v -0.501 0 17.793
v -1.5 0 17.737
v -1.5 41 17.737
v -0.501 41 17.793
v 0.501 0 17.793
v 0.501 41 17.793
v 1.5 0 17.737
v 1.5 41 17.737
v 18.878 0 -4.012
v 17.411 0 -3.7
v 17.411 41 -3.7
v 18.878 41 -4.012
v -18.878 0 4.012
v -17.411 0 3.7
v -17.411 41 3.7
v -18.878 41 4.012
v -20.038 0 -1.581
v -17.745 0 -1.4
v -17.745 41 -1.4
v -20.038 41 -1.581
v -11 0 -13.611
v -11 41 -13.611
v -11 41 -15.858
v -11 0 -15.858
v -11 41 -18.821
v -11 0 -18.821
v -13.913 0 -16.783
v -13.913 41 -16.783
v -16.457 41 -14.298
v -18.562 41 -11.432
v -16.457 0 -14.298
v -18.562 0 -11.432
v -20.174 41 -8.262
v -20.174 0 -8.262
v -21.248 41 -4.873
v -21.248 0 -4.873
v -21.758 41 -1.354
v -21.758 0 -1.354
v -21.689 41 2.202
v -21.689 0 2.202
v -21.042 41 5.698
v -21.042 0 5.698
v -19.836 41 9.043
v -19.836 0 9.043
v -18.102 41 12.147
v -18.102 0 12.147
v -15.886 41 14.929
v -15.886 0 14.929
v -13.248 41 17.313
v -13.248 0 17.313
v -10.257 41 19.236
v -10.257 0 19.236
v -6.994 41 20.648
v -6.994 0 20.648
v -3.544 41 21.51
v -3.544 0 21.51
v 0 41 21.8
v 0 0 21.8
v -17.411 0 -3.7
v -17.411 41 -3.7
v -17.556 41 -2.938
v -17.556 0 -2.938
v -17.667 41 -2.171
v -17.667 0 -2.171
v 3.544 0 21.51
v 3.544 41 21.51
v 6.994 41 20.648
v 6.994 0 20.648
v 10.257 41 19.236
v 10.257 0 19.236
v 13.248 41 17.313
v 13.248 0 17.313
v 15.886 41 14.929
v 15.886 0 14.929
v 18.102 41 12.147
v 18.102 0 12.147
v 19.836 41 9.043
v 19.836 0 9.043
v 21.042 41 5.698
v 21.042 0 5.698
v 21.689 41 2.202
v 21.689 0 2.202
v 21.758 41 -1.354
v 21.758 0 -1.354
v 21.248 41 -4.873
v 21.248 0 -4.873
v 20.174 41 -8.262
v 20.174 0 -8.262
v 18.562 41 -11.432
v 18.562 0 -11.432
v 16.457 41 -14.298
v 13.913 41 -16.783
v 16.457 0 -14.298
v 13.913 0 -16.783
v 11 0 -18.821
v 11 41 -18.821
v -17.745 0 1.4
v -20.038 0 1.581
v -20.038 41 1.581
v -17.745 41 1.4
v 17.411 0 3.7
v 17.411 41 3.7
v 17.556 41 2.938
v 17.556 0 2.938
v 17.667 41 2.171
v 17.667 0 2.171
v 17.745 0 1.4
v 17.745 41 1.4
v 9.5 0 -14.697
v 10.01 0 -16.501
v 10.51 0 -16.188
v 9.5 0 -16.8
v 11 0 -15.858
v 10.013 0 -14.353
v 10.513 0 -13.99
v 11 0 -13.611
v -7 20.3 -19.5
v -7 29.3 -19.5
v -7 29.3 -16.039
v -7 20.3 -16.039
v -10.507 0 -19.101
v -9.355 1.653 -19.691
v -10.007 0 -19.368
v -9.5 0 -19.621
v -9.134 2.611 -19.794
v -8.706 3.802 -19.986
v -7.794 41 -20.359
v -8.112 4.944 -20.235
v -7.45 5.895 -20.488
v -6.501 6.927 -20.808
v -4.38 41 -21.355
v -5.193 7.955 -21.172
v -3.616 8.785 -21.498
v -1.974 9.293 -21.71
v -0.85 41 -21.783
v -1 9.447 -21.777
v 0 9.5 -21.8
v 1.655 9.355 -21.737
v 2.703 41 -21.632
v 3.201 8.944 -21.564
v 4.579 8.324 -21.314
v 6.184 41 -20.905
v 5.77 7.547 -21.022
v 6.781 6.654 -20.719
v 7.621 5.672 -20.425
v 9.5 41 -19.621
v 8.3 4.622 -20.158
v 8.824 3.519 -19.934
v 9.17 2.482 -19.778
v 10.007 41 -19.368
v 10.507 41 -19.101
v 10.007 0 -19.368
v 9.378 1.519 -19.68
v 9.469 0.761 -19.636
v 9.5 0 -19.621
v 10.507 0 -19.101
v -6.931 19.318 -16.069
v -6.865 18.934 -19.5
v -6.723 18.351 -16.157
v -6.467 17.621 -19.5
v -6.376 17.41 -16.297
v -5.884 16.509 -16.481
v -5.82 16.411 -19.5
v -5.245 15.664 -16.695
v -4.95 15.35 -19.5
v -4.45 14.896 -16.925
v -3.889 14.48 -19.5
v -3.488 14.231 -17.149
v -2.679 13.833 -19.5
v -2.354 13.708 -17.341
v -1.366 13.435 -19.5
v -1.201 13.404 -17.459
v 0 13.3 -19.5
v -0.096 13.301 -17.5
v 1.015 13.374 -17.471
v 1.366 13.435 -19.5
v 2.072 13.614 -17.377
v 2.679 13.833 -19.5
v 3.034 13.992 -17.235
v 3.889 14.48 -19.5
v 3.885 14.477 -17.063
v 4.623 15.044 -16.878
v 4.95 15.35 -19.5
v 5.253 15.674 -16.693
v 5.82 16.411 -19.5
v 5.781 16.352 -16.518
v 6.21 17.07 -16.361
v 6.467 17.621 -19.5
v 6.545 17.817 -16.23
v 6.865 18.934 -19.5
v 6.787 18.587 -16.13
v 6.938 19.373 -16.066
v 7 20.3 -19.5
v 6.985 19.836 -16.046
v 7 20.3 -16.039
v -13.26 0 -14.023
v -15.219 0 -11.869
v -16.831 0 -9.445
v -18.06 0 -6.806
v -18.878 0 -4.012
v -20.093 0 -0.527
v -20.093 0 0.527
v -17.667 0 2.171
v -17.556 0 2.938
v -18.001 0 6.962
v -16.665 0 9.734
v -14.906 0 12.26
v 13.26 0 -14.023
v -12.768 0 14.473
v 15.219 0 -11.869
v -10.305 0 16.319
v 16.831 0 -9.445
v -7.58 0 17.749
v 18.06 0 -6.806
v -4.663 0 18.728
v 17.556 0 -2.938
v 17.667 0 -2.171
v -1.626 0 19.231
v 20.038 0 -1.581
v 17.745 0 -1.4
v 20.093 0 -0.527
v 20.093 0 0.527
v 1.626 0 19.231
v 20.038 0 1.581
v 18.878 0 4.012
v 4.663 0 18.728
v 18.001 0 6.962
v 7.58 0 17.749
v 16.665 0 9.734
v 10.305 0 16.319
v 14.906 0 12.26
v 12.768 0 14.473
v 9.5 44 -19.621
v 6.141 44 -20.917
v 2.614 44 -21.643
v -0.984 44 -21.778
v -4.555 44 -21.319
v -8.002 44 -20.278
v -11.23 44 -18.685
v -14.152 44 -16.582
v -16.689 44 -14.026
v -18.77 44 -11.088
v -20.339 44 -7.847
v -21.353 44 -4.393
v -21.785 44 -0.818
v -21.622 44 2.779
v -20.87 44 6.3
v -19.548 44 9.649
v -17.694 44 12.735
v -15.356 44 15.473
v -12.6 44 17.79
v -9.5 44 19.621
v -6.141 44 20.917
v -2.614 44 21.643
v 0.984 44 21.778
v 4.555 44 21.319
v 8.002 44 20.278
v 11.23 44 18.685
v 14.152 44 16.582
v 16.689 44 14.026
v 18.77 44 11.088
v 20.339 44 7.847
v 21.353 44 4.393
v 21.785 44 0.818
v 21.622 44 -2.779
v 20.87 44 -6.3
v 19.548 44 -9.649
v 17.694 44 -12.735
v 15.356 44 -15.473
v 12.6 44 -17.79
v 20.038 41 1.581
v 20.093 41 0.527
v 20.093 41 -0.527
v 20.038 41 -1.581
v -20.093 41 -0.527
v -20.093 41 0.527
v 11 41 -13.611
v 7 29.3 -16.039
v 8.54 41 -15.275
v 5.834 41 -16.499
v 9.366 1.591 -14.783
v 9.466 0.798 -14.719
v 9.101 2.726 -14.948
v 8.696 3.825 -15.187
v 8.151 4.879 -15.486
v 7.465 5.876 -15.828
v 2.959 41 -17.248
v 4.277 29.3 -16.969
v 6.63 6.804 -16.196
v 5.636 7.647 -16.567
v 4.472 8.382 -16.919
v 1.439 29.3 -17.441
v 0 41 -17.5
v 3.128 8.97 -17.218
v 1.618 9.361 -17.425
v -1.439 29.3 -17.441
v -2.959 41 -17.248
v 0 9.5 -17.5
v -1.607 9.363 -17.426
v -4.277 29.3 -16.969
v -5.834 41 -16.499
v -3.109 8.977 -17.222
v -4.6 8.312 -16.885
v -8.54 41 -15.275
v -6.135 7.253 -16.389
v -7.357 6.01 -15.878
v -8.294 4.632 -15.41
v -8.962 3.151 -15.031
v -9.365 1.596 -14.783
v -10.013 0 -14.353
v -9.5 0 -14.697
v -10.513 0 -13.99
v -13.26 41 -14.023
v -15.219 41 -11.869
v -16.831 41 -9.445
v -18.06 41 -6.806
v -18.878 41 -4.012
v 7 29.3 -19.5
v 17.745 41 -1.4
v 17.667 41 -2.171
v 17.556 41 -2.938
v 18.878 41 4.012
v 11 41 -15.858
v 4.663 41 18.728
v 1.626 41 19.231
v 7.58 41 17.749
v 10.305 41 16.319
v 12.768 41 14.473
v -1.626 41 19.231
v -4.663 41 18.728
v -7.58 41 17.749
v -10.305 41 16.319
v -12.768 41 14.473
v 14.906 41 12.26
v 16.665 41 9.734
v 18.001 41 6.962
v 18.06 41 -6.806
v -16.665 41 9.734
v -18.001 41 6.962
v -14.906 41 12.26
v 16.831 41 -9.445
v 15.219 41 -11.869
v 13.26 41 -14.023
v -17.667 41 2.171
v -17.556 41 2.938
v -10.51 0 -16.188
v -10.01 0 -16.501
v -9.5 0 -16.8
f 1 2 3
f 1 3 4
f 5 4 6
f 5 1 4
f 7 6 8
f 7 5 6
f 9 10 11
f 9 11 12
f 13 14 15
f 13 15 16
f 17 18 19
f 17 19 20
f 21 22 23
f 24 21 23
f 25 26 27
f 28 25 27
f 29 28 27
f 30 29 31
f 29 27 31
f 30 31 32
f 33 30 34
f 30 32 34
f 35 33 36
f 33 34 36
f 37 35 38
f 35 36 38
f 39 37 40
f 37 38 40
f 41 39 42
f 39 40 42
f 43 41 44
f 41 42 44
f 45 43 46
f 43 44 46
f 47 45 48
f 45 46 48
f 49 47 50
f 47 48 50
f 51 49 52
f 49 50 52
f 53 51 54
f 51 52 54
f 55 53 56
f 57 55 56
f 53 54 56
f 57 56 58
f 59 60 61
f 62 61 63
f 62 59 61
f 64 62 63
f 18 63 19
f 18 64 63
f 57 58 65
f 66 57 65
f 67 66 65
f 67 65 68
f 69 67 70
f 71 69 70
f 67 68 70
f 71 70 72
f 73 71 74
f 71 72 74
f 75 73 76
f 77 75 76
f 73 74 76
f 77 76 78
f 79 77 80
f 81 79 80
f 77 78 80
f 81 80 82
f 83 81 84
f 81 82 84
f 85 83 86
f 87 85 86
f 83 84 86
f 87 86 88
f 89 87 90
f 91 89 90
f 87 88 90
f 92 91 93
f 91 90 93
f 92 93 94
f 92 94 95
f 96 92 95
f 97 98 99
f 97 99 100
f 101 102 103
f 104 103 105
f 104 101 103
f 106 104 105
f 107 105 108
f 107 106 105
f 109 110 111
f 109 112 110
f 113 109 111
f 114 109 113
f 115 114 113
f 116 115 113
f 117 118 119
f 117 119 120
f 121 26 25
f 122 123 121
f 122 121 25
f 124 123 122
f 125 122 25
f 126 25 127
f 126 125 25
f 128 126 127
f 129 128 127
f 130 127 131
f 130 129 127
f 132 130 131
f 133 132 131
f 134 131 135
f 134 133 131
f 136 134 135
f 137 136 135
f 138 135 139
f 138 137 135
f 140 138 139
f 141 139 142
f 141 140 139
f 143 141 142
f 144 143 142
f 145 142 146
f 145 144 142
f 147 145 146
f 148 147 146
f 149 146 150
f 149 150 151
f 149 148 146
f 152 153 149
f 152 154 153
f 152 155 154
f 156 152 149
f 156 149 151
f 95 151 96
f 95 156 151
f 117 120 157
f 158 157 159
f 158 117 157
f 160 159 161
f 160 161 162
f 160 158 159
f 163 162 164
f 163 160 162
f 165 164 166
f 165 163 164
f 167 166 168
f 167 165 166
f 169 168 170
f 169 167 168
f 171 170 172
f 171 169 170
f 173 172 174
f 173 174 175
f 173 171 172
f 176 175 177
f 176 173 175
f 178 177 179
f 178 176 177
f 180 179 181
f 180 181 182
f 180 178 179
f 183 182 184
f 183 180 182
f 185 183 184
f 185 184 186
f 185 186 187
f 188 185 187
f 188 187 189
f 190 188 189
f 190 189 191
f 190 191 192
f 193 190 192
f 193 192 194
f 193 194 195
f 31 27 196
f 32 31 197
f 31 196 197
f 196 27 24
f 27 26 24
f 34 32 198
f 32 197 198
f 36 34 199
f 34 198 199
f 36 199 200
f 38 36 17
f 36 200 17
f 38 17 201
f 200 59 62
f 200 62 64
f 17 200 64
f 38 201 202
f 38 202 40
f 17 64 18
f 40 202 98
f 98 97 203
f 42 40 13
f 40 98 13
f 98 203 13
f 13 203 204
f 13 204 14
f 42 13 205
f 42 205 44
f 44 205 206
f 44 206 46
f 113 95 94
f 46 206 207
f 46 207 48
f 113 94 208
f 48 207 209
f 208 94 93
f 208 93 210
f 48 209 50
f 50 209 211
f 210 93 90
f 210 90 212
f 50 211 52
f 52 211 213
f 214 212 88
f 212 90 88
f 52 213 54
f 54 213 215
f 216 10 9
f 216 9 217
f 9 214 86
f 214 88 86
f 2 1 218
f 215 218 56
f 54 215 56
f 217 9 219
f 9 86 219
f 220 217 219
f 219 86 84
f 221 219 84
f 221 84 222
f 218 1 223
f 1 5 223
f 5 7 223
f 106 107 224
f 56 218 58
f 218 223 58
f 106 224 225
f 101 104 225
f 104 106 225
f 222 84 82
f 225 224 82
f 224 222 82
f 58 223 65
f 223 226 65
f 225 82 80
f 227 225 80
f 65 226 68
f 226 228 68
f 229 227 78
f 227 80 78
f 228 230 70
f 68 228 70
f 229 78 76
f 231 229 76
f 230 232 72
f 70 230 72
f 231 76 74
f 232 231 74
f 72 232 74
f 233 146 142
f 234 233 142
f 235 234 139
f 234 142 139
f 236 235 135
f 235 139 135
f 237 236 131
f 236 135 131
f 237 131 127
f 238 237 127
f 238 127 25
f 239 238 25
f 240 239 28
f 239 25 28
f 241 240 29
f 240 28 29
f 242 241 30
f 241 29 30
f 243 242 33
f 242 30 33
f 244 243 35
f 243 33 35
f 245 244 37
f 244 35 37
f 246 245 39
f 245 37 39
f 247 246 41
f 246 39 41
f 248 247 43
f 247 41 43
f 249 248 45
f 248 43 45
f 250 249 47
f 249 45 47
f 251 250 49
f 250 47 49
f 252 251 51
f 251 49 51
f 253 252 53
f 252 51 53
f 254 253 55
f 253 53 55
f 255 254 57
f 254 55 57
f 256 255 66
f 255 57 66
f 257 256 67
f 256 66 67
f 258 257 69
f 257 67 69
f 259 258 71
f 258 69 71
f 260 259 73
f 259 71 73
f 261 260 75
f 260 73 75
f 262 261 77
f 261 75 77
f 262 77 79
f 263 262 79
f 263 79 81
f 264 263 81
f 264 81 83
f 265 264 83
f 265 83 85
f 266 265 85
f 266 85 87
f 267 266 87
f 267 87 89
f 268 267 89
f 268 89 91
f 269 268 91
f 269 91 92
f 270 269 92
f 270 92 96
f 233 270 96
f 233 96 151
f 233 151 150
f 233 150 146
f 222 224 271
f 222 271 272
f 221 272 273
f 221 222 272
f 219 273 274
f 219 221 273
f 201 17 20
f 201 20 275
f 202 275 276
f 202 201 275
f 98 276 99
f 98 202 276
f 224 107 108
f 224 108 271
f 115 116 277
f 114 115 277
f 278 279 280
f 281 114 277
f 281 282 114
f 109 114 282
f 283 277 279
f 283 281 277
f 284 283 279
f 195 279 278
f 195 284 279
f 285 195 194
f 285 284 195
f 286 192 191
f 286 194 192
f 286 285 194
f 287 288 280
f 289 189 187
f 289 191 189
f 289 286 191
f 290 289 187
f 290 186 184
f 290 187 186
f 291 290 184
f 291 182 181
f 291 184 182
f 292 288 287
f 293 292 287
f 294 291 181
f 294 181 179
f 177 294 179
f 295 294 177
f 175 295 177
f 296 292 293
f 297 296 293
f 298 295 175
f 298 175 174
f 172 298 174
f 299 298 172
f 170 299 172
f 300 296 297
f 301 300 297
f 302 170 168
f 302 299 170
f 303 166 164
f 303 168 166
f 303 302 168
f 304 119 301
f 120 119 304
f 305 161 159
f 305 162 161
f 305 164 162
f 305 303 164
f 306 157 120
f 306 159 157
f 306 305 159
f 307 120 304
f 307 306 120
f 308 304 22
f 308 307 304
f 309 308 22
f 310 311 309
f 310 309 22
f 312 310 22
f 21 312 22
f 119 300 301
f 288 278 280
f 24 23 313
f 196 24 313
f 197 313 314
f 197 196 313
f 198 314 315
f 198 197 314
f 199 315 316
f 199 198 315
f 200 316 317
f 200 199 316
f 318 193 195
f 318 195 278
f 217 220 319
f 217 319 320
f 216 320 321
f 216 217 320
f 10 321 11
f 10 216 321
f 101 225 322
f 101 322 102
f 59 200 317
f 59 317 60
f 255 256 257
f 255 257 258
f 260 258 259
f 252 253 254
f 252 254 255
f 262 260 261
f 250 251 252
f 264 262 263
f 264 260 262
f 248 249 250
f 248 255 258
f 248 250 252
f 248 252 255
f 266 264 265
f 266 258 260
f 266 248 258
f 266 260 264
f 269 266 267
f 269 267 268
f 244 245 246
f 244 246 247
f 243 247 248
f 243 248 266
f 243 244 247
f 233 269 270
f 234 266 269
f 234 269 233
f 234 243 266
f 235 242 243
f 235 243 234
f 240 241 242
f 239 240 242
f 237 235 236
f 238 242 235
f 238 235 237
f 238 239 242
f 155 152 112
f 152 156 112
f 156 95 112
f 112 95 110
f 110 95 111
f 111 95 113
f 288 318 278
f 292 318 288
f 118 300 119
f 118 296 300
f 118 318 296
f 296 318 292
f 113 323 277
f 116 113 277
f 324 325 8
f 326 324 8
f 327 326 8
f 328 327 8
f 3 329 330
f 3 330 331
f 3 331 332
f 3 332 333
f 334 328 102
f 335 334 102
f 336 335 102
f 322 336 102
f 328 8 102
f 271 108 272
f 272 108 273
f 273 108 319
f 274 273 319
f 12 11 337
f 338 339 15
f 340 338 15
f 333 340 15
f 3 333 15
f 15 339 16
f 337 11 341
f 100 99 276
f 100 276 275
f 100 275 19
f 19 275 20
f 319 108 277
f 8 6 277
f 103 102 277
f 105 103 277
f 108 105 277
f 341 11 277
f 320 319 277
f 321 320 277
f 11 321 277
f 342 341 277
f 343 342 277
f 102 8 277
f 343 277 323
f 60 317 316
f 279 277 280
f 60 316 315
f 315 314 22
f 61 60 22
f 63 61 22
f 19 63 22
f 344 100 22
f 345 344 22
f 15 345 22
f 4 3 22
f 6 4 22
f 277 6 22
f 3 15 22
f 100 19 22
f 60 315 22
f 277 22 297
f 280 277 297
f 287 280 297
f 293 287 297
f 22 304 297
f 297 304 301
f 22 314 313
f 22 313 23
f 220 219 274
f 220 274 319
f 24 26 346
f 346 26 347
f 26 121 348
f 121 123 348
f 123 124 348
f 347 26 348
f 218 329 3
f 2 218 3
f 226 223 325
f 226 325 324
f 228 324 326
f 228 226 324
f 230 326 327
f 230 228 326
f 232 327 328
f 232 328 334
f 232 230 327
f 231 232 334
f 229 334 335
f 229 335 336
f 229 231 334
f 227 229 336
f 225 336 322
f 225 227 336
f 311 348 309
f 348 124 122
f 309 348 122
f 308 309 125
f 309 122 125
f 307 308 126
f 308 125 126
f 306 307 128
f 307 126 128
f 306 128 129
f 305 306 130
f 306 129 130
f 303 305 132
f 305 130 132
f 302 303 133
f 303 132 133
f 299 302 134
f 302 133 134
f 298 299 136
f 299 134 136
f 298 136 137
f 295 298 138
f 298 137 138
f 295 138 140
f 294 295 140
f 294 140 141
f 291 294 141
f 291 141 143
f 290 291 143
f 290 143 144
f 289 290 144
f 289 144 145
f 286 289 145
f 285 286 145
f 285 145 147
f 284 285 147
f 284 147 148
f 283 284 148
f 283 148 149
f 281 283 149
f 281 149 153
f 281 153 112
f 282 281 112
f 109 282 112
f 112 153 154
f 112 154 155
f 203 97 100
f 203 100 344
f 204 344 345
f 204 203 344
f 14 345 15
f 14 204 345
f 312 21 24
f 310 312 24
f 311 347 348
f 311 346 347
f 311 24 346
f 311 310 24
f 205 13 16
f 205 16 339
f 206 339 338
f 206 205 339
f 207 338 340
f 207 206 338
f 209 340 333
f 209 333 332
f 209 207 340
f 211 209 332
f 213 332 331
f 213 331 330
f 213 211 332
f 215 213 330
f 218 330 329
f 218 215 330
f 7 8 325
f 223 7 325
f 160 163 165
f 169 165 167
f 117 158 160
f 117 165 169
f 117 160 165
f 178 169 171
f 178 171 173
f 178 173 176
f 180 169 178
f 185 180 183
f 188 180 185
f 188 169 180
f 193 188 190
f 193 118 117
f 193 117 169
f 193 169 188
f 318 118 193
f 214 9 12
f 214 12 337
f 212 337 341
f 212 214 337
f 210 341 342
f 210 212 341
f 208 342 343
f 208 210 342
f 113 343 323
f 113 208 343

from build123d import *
from build123d.topology import SkipClean

# Parameters (mm, degrees)
SKETCH2_R               = 21.8
BOSS_EXTRUDE1_DEPTH     = 41
BOSS_EXTRUDE2_DEPTH     = 41
CUT_EXTRUDE1_REACH      = 65.696
CUT_EXTRUDE1_END_RADIUS = 17.5
CUT_EXTRUDE2_START      = -2
CUT_EXTRUDE2_DEPTH      = 3.460986
SKETCH6_R               = 21.8
BOSS_EXTRUDE3_DEPTH     = 3


with BuildPart() as part:
    # Sketch2 → Boss-Extrude1 (new body)
    with BuildSketch(Plane(origin=(0, 0, 0), x_dir=(1, 0, 0), z_dir=(0, 1, 0))):
        with Locations(Location((0, 0, 0), (0, 0, 270))):
            Circle(SKETCH2_R)
        with BuildLine():
            Line((-1.626404494, -19.231349626), (-1.5, -17.736685147))
            ThreePointArc((-1.5, -17.736685147), (0, -17.8), (1.5, -17.736685147))
            Line((1.5, -17.736685147), (1.626404494, -19.231349626))
            ThreePointArc((1.626404494, -19.231349626), (12.767961734, -14.473049201), (18.878439522, -4.011797753))
            Line((18.878439522, -4.011797753), (17.41120329, -3.7))
            ThreePointArc((17.41120329, -3.7), (17.615608663, -2.555451317), (17.74485841, -1.4))
            Line((17.74485841, -1.4), (20.037733373, -1.580898876))
            ThreePointArc((20.037733373, -1.580898876), (20.1, 0), (20.037733373, 1.580898876))
            Line((20.037733373, 1.580898876), (17.74485841, 1.4))
            ThreePointArc((17.74485841, 1.4), (17.615608663, 2.555451317), (17.41120329, 3.7))
            Line((17.41120329, 3.7), (18.878439522, 4.011797753))
            ThreePointArc((18.878439522, 4.011797753), (0, 19.3), (-18.878439522, 4.011797753))
            Line((-18.878439522, 4.011797753), (-17.41120329, 3.7))
            ThreePointArc((-17.41120329, 3.7), (-17.615608663, 2.555451317), (-17.74485841, 1.4))
            Line((-17.74485841, 1.4), (-20.037733373, 1.580898876))
            ThreePointArc((-20.037733373, 1.580898876), (-20.1, 0), (-20.037733373, -1.580898876))
            Line((-20.037733373, -1.580898876), (-17.74485841, -1.4))
            ThreePointArc((-17.74485841, -1.4), (-17.615608663, -2.555451317), (-17.41120329, -3.7))
            Line((-17.41120329, -3.7), (-18.878439522, -4.011797753))
            ThreePointArc((-18.878439522, -4.011797753), (-12.767961734, -14.473049201), (-1.626404494, -19.231349626))
        make_face(mode=Mode.SUBTRACT)
    extrude(amount=BOSS_EXTRUDE1_DEPTH)

    # Sketch3 → Boss-Extrude2 (add)
    with SkipClean():  # the faces are left unmerged after this step: merging them gives an invalid solid
        with BuildSketch(Plane.XZ):
            with BuildLine():
                Line((11, -18.82126457), (11, -13.610657589))
                ThreePointArc((11, -13.610657589), (0, -17.5), (-11, -13.610657589))
                Line((-11, -13.610657589), (-11, -18.82126457))
                ThreePointArc((-11, -18.82126457), (0, -21.8), (11, -18.82126457))
            make_face()
        extrude(amount=-BOSS_EXTRUDE2_DEPTH)

    # Cut-Extrude1: up to this cylinder (the profile starts outside it)
    with SkipClean():  # the faces are left unmerged after this step: merging them gives an invalid solid
        cut_extrude1_end = Plane(origin=(0, 4.031925, 0), z_dir=(0, -1, 0)) * Cylinder(CUT_EXTRUDE1_END_RADIUS, 167.392, mode=Mode.PRIVATE)
        # Sketch4 → Cut-Extrude1 (cut, up to the surface)
        with BuildSketch(Plane(origin=(0, 0, -21.8), x_dir=(-1, 0, 0), z_dir=(0, 0, -1)), mode=Mode.PRIVATE) as cut_extrude1_sk1:
            with BuildLine():
                Line((-9.5, 0), (9.5, 0))
                ThreePointArc((9.5, 0), (0, 9.5), (-9.5, 0))
            make_face()
        cut_extrude1_tool1 = extrude(cut_extrude1_sk1.sketch, amount=-CUT_EXTRUDE1_REACH, mode=Mode.PRIVATE) - cut_extrude1_end
        add(cut_extrude1_tool1.solids().sort_by_distance((0, 4.031925, -21.8))[0], mode=Mode.SUBTRACT)

    # Sketch5 → Cut-Extrude2 (cut)
    with SkipClean():  # the faces are left unmerged after this step: merging them gives an invalid solid
        with BuildSketch(Plane.XY.offset(-17.5).offset(CUT_EXTRUDE2_START)):
            with BuildLine():
                ThreePointArc((-7, 20.3), (0, 13.3), (7, 20.3))
                Line((7, 20.3), (7, 29.3))
                Line((7, 29.3), (-7, 29.3))
                Line((-7, 29.3), (-7, 20.3))
            make_face()
        extrude(amount=CUT_EXTRUDE2_DEPTH, mode=Mode.SUBTRACT)

    # Sketch6 → Boss-Extrude3 (add)
    with SkipClean():  # the faces are left unmerged after this step: merging them gives an invalid solid
        with BuildSketch(Plane(origin=(0, 41, 0), x_dir=(1, 0, 0), z_dir=(0, 1, 0))):
            with Locations(Location((0, 0, 0), (0, 0, 64.165074802))):
                Circle(SKETCH6_R)
        extrude(amount=BOSS_EXTRUDE3_DEPTH)


solid = part.part
